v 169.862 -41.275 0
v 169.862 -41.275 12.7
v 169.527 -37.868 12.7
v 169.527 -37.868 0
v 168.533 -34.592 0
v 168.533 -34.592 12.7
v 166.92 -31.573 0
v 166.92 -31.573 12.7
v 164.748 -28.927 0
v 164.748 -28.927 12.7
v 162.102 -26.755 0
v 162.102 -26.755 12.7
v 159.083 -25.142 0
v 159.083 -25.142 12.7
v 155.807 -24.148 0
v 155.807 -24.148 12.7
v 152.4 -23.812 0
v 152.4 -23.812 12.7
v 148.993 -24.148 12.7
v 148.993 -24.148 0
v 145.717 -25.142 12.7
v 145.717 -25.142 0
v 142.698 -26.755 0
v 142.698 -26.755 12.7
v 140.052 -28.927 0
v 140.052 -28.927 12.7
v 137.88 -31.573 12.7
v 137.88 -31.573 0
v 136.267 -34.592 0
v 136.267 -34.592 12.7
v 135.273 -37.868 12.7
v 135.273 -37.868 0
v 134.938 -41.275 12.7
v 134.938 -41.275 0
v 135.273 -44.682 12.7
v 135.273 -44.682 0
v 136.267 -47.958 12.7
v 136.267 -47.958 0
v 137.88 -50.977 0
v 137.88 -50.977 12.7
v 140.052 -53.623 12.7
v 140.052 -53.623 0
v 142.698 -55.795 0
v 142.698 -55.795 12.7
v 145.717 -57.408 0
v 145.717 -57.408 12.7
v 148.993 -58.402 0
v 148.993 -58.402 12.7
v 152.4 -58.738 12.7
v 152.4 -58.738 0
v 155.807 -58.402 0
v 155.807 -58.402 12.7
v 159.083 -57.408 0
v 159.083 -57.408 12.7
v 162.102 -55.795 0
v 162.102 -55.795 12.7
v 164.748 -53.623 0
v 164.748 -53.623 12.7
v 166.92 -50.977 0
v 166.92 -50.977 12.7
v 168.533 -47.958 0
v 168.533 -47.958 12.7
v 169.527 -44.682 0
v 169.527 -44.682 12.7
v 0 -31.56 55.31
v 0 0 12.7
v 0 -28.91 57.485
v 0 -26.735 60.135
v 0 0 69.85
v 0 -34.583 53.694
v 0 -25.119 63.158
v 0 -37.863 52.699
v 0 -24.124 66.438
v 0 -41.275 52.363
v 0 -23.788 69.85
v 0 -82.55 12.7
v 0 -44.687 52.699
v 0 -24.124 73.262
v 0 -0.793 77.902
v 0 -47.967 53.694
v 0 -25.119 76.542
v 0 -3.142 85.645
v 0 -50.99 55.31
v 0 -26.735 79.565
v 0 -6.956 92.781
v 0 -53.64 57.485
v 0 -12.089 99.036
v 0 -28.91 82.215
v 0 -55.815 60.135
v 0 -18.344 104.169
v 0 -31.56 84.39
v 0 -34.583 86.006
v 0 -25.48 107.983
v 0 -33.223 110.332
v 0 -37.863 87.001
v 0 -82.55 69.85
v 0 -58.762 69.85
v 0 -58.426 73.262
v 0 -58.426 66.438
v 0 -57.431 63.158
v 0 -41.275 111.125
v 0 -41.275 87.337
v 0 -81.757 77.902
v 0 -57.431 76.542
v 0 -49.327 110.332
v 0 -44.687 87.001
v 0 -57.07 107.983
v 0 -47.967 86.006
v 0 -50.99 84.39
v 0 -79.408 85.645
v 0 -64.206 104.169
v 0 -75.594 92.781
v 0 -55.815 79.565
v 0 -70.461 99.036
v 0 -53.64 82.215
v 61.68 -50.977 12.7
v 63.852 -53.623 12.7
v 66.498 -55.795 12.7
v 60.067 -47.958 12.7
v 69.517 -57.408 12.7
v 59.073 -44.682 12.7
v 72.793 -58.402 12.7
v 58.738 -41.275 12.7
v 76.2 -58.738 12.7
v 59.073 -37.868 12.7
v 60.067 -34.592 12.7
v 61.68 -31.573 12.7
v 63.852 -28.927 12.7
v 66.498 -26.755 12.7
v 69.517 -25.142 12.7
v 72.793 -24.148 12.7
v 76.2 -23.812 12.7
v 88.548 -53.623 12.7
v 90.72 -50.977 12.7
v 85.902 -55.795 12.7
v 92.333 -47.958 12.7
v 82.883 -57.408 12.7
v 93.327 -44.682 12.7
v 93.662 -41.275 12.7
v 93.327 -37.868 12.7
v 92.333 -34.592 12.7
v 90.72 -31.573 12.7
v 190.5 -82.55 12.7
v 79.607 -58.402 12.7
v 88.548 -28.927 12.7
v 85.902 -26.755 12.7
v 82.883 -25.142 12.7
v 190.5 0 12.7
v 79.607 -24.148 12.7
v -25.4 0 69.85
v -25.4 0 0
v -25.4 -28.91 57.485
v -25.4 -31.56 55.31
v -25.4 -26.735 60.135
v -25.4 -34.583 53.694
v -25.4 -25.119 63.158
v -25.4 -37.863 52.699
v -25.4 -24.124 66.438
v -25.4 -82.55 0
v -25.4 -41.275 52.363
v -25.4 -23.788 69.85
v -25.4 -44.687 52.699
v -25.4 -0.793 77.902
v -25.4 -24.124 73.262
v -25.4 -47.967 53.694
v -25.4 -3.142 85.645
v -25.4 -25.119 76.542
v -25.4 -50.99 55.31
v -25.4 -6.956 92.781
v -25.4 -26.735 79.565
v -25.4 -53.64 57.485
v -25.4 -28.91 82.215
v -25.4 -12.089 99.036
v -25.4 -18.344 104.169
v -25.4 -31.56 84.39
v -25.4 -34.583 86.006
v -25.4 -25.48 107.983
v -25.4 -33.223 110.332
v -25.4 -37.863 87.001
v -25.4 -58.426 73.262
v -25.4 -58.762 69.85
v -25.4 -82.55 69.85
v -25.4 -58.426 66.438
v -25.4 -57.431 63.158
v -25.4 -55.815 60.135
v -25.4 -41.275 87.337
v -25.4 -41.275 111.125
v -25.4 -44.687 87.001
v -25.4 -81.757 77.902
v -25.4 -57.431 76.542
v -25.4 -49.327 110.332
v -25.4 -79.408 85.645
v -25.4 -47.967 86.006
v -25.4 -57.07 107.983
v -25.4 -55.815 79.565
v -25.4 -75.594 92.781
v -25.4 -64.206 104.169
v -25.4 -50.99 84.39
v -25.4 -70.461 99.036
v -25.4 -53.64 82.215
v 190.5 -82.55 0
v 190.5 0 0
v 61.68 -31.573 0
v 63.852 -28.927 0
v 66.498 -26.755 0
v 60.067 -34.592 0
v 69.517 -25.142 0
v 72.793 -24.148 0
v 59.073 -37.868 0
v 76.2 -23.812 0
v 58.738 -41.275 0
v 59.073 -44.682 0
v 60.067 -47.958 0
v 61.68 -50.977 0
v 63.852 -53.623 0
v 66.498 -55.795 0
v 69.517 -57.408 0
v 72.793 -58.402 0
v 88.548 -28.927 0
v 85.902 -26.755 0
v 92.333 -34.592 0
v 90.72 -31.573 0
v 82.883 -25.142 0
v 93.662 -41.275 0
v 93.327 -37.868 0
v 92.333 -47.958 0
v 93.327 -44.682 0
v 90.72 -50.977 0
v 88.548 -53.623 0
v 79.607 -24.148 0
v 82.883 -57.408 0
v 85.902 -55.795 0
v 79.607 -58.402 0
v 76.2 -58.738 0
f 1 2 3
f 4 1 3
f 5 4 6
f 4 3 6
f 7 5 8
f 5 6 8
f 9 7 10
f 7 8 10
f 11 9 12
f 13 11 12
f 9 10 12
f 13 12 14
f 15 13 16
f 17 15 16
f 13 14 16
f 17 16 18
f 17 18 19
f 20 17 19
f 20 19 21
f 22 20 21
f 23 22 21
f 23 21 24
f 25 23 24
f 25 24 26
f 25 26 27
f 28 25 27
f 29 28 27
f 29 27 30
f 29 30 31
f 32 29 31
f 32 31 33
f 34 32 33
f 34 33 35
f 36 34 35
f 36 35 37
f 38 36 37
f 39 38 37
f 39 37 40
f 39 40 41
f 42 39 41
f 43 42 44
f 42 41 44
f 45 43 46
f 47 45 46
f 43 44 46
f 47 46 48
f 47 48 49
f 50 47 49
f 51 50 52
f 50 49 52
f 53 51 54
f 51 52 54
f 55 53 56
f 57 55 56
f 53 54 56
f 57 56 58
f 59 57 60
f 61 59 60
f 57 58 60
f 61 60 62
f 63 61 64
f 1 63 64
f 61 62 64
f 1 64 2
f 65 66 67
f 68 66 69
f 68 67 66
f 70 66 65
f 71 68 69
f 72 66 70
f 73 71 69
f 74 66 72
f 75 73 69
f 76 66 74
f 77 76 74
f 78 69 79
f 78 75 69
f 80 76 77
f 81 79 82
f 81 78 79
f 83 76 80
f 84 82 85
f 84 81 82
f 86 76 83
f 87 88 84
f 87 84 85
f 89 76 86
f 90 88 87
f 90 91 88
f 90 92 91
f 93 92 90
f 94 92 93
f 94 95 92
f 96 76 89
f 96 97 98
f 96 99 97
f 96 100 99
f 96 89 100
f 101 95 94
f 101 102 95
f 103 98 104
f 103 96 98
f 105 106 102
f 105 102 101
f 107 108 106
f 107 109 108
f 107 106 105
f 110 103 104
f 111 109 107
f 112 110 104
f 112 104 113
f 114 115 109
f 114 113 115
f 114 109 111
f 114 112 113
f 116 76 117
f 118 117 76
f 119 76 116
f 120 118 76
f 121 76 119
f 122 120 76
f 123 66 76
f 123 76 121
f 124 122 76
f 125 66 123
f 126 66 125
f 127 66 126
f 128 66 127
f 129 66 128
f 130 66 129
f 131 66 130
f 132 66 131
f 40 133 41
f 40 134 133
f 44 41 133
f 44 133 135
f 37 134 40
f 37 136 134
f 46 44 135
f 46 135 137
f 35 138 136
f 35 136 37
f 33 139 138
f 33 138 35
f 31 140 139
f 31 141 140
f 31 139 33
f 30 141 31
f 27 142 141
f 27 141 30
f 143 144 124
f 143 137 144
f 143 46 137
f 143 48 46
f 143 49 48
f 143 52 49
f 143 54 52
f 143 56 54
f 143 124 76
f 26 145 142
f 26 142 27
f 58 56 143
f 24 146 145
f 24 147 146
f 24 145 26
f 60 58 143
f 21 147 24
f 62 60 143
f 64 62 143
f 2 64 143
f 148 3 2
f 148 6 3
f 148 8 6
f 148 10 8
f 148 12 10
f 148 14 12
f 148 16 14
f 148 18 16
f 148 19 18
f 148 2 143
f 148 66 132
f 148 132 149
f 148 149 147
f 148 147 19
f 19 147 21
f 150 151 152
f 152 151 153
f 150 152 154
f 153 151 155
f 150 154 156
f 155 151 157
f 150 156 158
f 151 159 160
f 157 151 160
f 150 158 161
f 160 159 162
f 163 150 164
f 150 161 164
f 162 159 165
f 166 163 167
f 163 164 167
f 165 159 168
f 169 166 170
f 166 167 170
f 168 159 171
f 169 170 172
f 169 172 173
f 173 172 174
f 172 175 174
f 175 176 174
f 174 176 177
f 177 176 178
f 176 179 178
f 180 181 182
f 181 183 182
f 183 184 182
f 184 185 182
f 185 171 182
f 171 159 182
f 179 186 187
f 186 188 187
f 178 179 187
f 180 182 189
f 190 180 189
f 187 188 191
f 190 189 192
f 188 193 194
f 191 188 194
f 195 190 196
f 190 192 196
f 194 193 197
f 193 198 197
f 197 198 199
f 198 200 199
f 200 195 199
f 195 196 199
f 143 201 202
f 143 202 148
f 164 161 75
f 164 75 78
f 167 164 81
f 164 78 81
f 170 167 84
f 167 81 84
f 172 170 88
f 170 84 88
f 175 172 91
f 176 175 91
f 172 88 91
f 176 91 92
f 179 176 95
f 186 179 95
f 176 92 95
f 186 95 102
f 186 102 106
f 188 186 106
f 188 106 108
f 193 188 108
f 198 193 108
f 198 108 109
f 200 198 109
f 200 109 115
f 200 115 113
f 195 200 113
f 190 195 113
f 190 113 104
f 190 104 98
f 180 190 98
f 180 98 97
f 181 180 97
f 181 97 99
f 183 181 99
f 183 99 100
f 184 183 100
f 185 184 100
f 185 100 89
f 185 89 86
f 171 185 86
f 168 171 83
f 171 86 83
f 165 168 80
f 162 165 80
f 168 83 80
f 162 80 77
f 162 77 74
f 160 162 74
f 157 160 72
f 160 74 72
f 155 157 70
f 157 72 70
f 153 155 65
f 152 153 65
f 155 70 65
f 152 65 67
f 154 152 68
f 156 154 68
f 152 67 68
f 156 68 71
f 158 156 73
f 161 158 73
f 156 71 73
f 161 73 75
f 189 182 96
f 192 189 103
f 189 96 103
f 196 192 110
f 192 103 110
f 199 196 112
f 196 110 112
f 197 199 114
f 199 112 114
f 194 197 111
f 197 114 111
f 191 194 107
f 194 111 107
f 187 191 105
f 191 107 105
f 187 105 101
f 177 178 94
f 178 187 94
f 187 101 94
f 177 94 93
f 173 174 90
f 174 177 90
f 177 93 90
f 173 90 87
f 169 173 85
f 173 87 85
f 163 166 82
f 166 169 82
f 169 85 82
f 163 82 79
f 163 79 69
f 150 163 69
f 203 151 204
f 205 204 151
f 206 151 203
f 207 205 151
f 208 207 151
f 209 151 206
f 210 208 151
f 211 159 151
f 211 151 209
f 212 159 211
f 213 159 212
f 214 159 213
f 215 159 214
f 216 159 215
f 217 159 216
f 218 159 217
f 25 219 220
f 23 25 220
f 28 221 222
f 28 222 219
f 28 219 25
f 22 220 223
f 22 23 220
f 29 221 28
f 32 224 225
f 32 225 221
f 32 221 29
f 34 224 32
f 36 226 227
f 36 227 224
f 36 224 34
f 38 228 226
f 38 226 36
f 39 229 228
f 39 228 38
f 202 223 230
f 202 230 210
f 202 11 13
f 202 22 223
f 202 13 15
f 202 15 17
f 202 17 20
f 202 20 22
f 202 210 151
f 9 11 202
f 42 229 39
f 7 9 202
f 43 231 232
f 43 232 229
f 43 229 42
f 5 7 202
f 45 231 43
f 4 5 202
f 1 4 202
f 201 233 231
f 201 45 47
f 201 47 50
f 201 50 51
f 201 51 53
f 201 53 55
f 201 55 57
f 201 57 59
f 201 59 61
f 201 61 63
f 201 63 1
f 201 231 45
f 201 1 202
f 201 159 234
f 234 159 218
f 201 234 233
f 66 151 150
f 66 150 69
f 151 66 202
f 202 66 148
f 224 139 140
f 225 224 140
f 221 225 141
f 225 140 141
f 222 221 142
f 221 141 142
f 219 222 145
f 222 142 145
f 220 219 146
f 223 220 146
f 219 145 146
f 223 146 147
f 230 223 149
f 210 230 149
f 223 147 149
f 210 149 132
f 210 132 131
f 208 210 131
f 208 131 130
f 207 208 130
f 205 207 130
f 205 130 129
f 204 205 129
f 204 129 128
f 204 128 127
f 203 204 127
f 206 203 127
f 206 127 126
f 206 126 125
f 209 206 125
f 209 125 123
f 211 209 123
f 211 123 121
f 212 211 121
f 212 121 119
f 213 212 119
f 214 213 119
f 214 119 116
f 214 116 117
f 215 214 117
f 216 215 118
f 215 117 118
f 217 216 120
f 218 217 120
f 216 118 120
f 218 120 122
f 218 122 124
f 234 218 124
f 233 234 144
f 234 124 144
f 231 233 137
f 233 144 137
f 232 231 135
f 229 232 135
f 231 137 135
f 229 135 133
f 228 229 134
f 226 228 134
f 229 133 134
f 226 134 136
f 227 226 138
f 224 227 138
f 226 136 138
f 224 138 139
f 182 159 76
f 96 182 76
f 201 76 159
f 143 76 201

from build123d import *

# Parameters (mm, degrees)
F0_W     = 190.5
F0_H     = 12.7
F1_DEPTH = 82.55
F2_W     = 25.4
F2_H     = 127
F3_DEPTH = 82.55
F5_DEPTH = 25.401
F6_R     = 17.487125
F7_DEPTH = 25.401
F8_R     = 17.4625
F9_DEPTH = 25.4


with BuildPart() as f1:
    # F0 (on Front) → F1 (new body)
    with BuildSketch(Plane.XZ):
        with Locations((95.25, 6.35)):
            Rectangle(F0_W, F0_H)
    extrude(amount=F1_DEPTH)

    # F2 (on face) → F3 (join)
    with BuildSketch(Plane.XZ.offset(82.55)):
        with Locations((-12.7, 63.5)):
            Rectangle(F2_W, F2_H)
    extrude(amount=-F3_DEPTH)

    # F4 (on face) → F5 (cut, through all)
    with BuildSketch(Plane.YZ):
        with BuildLine():
            ThreePointArc((-82.55, 69.85), (-41.275, 111.125), (0, 69.85))
            Line((0, 69.85), (0, 127))
            Line((0, 127), (-82.55, 127))
            Line((-82.55, 127), (-82.55, 69.85))
        make_face()
    extrude(amount=-F5_DEPTH, mode=Mode.SUBTRACT)

    # F6 (on face) → F7 (cut, through all)
    with BuildSketch(Plane.YZ):
        with Locations((-41.275, 69.85)):
            Circle(F6_R)
    extrude(amount=-F7_DEPTH, mode=Mode.SUBTRACT)

    # F8 (on face) → F9 (cut)
    with BuildSketch(Plane.XY.offset(12.7)):
        with Locations((76.2, -41.275)):
            Circle(F8_R)
        with Locations((152.4, -41.275)):
            Circle(F8_R)
    extrude(amount=-F9_DEPTH, mode=Mode.SUBTRACT)


solid = f1.part
